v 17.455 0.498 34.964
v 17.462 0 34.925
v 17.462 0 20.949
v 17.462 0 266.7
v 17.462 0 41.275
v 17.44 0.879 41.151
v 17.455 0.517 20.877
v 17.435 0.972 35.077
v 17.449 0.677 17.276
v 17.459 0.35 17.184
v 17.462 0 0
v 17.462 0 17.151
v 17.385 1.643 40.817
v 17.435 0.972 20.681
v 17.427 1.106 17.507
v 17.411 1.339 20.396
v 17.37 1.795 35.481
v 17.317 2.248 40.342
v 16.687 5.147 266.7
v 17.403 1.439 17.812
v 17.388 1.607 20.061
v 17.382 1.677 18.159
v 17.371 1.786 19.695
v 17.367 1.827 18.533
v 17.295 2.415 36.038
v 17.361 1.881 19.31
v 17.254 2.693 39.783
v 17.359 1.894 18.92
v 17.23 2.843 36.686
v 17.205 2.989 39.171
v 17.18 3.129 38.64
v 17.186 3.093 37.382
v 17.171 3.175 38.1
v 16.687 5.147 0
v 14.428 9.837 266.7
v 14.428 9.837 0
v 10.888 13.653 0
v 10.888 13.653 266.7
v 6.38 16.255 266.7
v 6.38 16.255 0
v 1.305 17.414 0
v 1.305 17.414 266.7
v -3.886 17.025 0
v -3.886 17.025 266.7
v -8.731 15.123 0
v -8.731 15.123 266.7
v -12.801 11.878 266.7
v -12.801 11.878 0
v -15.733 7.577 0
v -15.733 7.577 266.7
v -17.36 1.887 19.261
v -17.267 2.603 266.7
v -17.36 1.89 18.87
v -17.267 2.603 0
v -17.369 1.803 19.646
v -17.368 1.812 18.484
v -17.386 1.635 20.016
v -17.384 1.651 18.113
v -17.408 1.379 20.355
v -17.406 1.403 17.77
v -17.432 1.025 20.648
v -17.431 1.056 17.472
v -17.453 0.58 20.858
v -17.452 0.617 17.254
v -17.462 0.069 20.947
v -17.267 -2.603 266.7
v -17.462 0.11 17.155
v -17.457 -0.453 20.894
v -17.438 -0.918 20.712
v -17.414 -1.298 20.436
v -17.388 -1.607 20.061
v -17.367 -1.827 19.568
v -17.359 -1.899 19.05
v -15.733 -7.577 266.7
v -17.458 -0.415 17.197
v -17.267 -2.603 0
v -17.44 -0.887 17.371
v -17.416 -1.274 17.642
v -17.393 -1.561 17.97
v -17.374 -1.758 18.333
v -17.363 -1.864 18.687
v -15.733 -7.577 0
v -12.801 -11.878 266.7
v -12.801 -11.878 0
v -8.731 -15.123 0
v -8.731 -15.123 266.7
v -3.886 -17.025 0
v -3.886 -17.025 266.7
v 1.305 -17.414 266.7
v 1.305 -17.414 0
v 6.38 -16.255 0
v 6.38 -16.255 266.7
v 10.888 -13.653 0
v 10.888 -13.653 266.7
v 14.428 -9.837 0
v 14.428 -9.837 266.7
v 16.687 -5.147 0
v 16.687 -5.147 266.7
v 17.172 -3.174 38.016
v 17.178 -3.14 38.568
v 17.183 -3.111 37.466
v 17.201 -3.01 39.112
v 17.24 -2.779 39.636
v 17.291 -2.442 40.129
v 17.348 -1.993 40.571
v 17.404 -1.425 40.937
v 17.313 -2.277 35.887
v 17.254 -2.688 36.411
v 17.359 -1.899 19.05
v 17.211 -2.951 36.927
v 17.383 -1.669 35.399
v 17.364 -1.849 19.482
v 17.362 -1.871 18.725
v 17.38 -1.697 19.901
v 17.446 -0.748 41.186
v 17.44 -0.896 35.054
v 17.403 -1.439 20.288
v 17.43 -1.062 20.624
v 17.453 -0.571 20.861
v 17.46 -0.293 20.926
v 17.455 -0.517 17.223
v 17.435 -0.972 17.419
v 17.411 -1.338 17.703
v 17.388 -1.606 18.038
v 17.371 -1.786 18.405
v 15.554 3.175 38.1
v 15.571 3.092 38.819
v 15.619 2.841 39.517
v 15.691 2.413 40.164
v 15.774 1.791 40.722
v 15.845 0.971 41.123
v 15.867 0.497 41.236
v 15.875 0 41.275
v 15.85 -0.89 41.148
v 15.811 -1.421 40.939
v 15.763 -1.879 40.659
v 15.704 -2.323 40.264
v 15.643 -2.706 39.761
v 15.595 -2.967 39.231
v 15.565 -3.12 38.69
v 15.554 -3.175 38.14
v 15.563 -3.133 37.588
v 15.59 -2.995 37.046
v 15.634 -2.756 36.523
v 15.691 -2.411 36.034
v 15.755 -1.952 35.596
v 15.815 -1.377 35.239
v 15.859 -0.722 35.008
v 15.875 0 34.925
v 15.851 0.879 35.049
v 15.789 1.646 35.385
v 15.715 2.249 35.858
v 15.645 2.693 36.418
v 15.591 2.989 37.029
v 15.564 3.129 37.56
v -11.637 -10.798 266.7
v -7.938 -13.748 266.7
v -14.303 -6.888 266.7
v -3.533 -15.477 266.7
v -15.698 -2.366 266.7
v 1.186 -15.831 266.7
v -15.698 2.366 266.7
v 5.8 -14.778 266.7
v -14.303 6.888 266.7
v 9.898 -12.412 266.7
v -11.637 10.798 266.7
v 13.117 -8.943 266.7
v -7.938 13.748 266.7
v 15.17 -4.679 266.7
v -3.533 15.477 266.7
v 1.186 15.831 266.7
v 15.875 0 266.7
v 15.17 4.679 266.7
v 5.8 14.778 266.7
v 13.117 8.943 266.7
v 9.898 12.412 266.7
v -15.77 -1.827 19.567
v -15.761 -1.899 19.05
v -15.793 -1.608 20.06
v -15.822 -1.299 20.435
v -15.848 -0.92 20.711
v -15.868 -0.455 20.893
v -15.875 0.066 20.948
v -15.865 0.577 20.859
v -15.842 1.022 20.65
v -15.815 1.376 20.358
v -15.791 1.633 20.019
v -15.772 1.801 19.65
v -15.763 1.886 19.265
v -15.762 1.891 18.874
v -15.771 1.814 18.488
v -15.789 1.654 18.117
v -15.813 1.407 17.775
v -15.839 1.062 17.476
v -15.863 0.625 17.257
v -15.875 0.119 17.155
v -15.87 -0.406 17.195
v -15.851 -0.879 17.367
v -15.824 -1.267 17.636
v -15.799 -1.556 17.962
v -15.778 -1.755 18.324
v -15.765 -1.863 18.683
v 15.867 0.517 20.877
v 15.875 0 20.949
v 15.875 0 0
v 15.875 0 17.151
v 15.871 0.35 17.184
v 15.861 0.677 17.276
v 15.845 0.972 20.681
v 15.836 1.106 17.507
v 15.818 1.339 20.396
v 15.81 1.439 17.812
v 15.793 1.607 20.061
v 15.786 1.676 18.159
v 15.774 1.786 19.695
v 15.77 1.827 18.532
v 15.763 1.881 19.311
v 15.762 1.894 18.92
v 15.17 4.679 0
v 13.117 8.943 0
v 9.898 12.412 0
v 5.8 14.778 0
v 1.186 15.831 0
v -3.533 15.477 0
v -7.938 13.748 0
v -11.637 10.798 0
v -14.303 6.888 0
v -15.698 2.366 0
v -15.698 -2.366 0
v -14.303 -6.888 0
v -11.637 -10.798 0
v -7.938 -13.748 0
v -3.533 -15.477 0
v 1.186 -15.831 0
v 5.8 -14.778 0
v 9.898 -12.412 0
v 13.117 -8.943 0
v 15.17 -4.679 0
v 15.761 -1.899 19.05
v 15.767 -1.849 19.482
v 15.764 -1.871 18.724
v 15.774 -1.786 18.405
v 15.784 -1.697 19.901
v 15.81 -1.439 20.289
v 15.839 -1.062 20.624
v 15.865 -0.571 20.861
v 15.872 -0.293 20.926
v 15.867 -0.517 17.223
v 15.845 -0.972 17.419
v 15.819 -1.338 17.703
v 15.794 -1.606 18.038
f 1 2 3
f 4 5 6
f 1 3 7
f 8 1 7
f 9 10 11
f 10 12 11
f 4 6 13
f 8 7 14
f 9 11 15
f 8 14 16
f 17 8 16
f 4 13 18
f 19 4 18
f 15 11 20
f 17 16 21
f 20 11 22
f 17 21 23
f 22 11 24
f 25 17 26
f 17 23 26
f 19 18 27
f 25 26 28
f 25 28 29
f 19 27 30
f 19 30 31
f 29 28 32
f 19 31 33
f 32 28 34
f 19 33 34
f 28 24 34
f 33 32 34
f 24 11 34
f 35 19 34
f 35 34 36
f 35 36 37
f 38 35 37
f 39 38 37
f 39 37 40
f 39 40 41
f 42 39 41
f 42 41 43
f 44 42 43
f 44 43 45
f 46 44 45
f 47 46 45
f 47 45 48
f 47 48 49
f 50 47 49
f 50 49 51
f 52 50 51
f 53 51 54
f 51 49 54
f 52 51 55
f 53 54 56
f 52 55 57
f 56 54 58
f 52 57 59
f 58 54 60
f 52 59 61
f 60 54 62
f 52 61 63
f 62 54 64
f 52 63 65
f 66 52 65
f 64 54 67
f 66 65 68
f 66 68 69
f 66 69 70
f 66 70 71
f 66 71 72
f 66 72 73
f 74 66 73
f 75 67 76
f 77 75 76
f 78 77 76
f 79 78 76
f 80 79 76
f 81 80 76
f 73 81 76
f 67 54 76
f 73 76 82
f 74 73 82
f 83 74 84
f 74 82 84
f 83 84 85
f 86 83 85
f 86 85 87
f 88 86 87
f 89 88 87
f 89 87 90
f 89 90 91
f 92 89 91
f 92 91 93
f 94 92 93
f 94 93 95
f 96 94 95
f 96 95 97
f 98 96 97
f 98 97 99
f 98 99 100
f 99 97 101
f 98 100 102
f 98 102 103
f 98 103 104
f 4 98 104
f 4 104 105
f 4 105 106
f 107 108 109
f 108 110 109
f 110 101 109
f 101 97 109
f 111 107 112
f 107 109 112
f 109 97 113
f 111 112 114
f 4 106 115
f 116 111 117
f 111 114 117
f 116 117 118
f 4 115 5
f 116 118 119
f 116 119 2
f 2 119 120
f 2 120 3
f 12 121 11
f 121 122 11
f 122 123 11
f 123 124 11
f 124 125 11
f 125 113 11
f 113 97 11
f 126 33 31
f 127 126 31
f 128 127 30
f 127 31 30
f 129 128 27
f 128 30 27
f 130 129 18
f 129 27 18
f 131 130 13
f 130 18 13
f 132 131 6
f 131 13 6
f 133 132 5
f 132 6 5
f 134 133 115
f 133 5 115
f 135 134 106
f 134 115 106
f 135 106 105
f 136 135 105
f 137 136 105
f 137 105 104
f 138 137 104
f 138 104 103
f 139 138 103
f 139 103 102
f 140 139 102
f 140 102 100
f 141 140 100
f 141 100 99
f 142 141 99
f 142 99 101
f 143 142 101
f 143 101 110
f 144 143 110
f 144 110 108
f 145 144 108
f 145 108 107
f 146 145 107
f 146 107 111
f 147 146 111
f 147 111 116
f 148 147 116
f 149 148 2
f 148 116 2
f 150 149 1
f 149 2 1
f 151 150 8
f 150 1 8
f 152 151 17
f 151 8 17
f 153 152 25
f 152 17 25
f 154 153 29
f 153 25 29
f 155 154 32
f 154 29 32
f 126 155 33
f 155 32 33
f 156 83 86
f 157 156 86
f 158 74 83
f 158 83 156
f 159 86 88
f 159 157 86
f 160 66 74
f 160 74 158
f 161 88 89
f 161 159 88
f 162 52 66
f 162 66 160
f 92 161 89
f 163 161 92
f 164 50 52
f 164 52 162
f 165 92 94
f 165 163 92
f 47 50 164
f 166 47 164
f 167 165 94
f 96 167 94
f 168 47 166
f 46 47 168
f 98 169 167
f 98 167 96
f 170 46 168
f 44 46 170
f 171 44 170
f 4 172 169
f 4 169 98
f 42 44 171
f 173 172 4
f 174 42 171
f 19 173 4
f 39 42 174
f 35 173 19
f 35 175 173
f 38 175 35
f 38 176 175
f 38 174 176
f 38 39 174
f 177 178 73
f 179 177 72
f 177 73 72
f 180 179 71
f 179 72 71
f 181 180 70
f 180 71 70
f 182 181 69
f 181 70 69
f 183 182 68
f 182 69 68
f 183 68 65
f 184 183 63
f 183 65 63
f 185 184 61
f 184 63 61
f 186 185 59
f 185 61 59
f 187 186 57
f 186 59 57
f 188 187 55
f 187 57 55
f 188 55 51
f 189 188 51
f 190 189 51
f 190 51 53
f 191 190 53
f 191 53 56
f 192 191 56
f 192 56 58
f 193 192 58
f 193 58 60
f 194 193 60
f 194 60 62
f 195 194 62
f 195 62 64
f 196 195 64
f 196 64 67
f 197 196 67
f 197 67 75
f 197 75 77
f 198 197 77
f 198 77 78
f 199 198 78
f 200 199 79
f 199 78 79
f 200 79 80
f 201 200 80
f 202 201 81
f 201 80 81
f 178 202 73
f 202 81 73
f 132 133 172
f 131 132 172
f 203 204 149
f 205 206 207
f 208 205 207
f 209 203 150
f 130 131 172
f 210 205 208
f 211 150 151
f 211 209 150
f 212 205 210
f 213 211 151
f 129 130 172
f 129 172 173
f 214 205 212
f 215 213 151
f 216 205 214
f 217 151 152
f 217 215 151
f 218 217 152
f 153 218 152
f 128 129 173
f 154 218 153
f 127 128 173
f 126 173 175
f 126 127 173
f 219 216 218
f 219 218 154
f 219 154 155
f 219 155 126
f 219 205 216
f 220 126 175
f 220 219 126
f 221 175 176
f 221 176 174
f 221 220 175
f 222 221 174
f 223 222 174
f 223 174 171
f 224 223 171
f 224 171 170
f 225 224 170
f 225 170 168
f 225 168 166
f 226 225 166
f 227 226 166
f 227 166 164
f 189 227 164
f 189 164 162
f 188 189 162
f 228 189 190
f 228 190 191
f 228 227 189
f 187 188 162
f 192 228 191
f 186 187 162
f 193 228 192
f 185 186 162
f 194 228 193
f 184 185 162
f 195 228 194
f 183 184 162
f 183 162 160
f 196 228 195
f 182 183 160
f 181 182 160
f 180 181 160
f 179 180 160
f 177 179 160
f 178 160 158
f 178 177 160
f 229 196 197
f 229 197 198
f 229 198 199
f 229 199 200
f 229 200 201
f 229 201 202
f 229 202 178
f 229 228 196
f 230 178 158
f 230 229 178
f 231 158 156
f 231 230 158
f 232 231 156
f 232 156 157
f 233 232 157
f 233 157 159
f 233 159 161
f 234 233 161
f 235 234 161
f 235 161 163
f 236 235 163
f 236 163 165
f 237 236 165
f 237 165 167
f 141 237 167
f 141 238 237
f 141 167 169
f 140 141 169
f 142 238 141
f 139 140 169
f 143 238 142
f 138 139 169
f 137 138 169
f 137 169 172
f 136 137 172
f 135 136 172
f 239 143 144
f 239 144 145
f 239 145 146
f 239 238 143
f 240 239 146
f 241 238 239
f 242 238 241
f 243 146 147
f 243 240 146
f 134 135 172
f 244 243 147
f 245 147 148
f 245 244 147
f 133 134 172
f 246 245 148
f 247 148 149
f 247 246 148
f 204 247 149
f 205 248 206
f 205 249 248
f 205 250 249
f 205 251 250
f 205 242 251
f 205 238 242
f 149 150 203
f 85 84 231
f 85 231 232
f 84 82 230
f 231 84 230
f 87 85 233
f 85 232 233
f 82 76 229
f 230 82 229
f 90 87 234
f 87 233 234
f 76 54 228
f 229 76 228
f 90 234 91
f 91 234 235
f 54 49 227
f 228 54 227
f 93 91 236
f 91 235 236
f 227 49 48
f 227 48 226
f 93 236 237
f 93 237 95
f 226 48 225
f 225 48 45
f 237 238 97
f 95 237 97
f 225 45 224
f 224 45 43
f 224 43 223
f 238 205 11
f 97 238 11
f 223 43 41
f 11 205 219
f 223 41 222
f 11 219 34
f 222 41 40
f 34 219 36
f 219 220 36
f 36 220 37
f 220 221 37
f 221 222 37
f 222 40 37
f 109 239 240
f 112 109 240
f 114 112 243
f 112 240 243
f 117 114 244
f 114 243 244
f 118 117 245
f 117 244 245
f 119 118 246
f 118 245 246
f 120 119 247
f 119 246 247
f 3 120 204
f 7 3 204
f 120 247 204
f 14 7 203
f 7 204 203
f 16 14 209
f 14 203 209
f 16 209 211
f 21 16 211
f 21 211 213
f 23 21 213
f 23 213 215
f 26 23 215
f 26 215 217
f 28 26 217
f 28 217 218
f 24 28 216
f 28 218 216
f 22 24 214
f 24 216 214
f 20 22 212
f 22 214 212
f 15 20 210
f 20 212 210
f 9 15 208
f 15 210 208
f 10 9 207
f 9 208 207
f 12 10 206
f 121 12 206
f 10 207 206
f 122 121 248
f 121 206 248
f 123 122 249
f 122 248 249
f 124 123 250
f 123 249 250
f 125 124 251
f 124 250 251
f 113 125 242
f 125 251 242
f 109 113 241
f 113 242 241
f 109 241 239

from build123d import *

# Parameters (mm, degrees)
SKETCH2_R                        = 17.4625
SKETCH2_R_2                      = 15.875
BOSS_EXTRUDE1_DEPTH              = 266.7
F_6_CLEARANCE_HOLE1_D            = 3.7973
F_1_4_0_25_DIAMETER_HOLE1_REACH  = 36.925
F_1_4_0_25_DIAMETER_HOLE1_BORE_R = 3.175


with BuildPart() as part:
    # Sketch2 → Boss-Extrude1 (new body)
    with BuildSketch(Plane.XY):
        Circle(SKETCH2_R)
        Circle(SKETCH2_R_2, mode=Mode.SUBTRACT)
    extrude(amount=BOSS_EXTRUDE1_DEPTH)

    # #6 Clearance Hole1 (through all)
    with Locations(Plane(origin=(17.4625, 0, 19.05), x_dir=(0, 1, 0), z_dir=(1, 0, 0))):
        with Locations((0, 0)):
            Hole(F_6_CLEARANCE_HOLE1_D / 2)

    # 1/4 (0.25) Diameter Hole1 bore (on position points) → 1/4 (0.25) Diameter Hole1 (cut, up to next)
    with BuildSketch(Plane(origin=(17.4625, 0, 38.1), x_dir=(0, 1, 0), z_dir=(1, 0, 0)), mode=Mode.PRIVATE) as f_1_4_0_25_diameter_hole1_sk1:
        Circle(F_1_4_0_25_DIAMETER_HOLE1_BORE_R)
    f_1_4_0_25_diameter_hole1_tool1 = extrude(f_1_4_0_25_diameter_hole1_sk1.sketch, amount=-F_1_4_0_25_DIAMETER_HOLE1_REACH, mode=Mode.PRIVATE) & part.part
    add(f_1_4_0_25_diameter_hole1_tool1.solids().sort_by_distance((17.4625, 0, 38.1))[0], mode=Mode.SUBTRACT)


solid = part.part
